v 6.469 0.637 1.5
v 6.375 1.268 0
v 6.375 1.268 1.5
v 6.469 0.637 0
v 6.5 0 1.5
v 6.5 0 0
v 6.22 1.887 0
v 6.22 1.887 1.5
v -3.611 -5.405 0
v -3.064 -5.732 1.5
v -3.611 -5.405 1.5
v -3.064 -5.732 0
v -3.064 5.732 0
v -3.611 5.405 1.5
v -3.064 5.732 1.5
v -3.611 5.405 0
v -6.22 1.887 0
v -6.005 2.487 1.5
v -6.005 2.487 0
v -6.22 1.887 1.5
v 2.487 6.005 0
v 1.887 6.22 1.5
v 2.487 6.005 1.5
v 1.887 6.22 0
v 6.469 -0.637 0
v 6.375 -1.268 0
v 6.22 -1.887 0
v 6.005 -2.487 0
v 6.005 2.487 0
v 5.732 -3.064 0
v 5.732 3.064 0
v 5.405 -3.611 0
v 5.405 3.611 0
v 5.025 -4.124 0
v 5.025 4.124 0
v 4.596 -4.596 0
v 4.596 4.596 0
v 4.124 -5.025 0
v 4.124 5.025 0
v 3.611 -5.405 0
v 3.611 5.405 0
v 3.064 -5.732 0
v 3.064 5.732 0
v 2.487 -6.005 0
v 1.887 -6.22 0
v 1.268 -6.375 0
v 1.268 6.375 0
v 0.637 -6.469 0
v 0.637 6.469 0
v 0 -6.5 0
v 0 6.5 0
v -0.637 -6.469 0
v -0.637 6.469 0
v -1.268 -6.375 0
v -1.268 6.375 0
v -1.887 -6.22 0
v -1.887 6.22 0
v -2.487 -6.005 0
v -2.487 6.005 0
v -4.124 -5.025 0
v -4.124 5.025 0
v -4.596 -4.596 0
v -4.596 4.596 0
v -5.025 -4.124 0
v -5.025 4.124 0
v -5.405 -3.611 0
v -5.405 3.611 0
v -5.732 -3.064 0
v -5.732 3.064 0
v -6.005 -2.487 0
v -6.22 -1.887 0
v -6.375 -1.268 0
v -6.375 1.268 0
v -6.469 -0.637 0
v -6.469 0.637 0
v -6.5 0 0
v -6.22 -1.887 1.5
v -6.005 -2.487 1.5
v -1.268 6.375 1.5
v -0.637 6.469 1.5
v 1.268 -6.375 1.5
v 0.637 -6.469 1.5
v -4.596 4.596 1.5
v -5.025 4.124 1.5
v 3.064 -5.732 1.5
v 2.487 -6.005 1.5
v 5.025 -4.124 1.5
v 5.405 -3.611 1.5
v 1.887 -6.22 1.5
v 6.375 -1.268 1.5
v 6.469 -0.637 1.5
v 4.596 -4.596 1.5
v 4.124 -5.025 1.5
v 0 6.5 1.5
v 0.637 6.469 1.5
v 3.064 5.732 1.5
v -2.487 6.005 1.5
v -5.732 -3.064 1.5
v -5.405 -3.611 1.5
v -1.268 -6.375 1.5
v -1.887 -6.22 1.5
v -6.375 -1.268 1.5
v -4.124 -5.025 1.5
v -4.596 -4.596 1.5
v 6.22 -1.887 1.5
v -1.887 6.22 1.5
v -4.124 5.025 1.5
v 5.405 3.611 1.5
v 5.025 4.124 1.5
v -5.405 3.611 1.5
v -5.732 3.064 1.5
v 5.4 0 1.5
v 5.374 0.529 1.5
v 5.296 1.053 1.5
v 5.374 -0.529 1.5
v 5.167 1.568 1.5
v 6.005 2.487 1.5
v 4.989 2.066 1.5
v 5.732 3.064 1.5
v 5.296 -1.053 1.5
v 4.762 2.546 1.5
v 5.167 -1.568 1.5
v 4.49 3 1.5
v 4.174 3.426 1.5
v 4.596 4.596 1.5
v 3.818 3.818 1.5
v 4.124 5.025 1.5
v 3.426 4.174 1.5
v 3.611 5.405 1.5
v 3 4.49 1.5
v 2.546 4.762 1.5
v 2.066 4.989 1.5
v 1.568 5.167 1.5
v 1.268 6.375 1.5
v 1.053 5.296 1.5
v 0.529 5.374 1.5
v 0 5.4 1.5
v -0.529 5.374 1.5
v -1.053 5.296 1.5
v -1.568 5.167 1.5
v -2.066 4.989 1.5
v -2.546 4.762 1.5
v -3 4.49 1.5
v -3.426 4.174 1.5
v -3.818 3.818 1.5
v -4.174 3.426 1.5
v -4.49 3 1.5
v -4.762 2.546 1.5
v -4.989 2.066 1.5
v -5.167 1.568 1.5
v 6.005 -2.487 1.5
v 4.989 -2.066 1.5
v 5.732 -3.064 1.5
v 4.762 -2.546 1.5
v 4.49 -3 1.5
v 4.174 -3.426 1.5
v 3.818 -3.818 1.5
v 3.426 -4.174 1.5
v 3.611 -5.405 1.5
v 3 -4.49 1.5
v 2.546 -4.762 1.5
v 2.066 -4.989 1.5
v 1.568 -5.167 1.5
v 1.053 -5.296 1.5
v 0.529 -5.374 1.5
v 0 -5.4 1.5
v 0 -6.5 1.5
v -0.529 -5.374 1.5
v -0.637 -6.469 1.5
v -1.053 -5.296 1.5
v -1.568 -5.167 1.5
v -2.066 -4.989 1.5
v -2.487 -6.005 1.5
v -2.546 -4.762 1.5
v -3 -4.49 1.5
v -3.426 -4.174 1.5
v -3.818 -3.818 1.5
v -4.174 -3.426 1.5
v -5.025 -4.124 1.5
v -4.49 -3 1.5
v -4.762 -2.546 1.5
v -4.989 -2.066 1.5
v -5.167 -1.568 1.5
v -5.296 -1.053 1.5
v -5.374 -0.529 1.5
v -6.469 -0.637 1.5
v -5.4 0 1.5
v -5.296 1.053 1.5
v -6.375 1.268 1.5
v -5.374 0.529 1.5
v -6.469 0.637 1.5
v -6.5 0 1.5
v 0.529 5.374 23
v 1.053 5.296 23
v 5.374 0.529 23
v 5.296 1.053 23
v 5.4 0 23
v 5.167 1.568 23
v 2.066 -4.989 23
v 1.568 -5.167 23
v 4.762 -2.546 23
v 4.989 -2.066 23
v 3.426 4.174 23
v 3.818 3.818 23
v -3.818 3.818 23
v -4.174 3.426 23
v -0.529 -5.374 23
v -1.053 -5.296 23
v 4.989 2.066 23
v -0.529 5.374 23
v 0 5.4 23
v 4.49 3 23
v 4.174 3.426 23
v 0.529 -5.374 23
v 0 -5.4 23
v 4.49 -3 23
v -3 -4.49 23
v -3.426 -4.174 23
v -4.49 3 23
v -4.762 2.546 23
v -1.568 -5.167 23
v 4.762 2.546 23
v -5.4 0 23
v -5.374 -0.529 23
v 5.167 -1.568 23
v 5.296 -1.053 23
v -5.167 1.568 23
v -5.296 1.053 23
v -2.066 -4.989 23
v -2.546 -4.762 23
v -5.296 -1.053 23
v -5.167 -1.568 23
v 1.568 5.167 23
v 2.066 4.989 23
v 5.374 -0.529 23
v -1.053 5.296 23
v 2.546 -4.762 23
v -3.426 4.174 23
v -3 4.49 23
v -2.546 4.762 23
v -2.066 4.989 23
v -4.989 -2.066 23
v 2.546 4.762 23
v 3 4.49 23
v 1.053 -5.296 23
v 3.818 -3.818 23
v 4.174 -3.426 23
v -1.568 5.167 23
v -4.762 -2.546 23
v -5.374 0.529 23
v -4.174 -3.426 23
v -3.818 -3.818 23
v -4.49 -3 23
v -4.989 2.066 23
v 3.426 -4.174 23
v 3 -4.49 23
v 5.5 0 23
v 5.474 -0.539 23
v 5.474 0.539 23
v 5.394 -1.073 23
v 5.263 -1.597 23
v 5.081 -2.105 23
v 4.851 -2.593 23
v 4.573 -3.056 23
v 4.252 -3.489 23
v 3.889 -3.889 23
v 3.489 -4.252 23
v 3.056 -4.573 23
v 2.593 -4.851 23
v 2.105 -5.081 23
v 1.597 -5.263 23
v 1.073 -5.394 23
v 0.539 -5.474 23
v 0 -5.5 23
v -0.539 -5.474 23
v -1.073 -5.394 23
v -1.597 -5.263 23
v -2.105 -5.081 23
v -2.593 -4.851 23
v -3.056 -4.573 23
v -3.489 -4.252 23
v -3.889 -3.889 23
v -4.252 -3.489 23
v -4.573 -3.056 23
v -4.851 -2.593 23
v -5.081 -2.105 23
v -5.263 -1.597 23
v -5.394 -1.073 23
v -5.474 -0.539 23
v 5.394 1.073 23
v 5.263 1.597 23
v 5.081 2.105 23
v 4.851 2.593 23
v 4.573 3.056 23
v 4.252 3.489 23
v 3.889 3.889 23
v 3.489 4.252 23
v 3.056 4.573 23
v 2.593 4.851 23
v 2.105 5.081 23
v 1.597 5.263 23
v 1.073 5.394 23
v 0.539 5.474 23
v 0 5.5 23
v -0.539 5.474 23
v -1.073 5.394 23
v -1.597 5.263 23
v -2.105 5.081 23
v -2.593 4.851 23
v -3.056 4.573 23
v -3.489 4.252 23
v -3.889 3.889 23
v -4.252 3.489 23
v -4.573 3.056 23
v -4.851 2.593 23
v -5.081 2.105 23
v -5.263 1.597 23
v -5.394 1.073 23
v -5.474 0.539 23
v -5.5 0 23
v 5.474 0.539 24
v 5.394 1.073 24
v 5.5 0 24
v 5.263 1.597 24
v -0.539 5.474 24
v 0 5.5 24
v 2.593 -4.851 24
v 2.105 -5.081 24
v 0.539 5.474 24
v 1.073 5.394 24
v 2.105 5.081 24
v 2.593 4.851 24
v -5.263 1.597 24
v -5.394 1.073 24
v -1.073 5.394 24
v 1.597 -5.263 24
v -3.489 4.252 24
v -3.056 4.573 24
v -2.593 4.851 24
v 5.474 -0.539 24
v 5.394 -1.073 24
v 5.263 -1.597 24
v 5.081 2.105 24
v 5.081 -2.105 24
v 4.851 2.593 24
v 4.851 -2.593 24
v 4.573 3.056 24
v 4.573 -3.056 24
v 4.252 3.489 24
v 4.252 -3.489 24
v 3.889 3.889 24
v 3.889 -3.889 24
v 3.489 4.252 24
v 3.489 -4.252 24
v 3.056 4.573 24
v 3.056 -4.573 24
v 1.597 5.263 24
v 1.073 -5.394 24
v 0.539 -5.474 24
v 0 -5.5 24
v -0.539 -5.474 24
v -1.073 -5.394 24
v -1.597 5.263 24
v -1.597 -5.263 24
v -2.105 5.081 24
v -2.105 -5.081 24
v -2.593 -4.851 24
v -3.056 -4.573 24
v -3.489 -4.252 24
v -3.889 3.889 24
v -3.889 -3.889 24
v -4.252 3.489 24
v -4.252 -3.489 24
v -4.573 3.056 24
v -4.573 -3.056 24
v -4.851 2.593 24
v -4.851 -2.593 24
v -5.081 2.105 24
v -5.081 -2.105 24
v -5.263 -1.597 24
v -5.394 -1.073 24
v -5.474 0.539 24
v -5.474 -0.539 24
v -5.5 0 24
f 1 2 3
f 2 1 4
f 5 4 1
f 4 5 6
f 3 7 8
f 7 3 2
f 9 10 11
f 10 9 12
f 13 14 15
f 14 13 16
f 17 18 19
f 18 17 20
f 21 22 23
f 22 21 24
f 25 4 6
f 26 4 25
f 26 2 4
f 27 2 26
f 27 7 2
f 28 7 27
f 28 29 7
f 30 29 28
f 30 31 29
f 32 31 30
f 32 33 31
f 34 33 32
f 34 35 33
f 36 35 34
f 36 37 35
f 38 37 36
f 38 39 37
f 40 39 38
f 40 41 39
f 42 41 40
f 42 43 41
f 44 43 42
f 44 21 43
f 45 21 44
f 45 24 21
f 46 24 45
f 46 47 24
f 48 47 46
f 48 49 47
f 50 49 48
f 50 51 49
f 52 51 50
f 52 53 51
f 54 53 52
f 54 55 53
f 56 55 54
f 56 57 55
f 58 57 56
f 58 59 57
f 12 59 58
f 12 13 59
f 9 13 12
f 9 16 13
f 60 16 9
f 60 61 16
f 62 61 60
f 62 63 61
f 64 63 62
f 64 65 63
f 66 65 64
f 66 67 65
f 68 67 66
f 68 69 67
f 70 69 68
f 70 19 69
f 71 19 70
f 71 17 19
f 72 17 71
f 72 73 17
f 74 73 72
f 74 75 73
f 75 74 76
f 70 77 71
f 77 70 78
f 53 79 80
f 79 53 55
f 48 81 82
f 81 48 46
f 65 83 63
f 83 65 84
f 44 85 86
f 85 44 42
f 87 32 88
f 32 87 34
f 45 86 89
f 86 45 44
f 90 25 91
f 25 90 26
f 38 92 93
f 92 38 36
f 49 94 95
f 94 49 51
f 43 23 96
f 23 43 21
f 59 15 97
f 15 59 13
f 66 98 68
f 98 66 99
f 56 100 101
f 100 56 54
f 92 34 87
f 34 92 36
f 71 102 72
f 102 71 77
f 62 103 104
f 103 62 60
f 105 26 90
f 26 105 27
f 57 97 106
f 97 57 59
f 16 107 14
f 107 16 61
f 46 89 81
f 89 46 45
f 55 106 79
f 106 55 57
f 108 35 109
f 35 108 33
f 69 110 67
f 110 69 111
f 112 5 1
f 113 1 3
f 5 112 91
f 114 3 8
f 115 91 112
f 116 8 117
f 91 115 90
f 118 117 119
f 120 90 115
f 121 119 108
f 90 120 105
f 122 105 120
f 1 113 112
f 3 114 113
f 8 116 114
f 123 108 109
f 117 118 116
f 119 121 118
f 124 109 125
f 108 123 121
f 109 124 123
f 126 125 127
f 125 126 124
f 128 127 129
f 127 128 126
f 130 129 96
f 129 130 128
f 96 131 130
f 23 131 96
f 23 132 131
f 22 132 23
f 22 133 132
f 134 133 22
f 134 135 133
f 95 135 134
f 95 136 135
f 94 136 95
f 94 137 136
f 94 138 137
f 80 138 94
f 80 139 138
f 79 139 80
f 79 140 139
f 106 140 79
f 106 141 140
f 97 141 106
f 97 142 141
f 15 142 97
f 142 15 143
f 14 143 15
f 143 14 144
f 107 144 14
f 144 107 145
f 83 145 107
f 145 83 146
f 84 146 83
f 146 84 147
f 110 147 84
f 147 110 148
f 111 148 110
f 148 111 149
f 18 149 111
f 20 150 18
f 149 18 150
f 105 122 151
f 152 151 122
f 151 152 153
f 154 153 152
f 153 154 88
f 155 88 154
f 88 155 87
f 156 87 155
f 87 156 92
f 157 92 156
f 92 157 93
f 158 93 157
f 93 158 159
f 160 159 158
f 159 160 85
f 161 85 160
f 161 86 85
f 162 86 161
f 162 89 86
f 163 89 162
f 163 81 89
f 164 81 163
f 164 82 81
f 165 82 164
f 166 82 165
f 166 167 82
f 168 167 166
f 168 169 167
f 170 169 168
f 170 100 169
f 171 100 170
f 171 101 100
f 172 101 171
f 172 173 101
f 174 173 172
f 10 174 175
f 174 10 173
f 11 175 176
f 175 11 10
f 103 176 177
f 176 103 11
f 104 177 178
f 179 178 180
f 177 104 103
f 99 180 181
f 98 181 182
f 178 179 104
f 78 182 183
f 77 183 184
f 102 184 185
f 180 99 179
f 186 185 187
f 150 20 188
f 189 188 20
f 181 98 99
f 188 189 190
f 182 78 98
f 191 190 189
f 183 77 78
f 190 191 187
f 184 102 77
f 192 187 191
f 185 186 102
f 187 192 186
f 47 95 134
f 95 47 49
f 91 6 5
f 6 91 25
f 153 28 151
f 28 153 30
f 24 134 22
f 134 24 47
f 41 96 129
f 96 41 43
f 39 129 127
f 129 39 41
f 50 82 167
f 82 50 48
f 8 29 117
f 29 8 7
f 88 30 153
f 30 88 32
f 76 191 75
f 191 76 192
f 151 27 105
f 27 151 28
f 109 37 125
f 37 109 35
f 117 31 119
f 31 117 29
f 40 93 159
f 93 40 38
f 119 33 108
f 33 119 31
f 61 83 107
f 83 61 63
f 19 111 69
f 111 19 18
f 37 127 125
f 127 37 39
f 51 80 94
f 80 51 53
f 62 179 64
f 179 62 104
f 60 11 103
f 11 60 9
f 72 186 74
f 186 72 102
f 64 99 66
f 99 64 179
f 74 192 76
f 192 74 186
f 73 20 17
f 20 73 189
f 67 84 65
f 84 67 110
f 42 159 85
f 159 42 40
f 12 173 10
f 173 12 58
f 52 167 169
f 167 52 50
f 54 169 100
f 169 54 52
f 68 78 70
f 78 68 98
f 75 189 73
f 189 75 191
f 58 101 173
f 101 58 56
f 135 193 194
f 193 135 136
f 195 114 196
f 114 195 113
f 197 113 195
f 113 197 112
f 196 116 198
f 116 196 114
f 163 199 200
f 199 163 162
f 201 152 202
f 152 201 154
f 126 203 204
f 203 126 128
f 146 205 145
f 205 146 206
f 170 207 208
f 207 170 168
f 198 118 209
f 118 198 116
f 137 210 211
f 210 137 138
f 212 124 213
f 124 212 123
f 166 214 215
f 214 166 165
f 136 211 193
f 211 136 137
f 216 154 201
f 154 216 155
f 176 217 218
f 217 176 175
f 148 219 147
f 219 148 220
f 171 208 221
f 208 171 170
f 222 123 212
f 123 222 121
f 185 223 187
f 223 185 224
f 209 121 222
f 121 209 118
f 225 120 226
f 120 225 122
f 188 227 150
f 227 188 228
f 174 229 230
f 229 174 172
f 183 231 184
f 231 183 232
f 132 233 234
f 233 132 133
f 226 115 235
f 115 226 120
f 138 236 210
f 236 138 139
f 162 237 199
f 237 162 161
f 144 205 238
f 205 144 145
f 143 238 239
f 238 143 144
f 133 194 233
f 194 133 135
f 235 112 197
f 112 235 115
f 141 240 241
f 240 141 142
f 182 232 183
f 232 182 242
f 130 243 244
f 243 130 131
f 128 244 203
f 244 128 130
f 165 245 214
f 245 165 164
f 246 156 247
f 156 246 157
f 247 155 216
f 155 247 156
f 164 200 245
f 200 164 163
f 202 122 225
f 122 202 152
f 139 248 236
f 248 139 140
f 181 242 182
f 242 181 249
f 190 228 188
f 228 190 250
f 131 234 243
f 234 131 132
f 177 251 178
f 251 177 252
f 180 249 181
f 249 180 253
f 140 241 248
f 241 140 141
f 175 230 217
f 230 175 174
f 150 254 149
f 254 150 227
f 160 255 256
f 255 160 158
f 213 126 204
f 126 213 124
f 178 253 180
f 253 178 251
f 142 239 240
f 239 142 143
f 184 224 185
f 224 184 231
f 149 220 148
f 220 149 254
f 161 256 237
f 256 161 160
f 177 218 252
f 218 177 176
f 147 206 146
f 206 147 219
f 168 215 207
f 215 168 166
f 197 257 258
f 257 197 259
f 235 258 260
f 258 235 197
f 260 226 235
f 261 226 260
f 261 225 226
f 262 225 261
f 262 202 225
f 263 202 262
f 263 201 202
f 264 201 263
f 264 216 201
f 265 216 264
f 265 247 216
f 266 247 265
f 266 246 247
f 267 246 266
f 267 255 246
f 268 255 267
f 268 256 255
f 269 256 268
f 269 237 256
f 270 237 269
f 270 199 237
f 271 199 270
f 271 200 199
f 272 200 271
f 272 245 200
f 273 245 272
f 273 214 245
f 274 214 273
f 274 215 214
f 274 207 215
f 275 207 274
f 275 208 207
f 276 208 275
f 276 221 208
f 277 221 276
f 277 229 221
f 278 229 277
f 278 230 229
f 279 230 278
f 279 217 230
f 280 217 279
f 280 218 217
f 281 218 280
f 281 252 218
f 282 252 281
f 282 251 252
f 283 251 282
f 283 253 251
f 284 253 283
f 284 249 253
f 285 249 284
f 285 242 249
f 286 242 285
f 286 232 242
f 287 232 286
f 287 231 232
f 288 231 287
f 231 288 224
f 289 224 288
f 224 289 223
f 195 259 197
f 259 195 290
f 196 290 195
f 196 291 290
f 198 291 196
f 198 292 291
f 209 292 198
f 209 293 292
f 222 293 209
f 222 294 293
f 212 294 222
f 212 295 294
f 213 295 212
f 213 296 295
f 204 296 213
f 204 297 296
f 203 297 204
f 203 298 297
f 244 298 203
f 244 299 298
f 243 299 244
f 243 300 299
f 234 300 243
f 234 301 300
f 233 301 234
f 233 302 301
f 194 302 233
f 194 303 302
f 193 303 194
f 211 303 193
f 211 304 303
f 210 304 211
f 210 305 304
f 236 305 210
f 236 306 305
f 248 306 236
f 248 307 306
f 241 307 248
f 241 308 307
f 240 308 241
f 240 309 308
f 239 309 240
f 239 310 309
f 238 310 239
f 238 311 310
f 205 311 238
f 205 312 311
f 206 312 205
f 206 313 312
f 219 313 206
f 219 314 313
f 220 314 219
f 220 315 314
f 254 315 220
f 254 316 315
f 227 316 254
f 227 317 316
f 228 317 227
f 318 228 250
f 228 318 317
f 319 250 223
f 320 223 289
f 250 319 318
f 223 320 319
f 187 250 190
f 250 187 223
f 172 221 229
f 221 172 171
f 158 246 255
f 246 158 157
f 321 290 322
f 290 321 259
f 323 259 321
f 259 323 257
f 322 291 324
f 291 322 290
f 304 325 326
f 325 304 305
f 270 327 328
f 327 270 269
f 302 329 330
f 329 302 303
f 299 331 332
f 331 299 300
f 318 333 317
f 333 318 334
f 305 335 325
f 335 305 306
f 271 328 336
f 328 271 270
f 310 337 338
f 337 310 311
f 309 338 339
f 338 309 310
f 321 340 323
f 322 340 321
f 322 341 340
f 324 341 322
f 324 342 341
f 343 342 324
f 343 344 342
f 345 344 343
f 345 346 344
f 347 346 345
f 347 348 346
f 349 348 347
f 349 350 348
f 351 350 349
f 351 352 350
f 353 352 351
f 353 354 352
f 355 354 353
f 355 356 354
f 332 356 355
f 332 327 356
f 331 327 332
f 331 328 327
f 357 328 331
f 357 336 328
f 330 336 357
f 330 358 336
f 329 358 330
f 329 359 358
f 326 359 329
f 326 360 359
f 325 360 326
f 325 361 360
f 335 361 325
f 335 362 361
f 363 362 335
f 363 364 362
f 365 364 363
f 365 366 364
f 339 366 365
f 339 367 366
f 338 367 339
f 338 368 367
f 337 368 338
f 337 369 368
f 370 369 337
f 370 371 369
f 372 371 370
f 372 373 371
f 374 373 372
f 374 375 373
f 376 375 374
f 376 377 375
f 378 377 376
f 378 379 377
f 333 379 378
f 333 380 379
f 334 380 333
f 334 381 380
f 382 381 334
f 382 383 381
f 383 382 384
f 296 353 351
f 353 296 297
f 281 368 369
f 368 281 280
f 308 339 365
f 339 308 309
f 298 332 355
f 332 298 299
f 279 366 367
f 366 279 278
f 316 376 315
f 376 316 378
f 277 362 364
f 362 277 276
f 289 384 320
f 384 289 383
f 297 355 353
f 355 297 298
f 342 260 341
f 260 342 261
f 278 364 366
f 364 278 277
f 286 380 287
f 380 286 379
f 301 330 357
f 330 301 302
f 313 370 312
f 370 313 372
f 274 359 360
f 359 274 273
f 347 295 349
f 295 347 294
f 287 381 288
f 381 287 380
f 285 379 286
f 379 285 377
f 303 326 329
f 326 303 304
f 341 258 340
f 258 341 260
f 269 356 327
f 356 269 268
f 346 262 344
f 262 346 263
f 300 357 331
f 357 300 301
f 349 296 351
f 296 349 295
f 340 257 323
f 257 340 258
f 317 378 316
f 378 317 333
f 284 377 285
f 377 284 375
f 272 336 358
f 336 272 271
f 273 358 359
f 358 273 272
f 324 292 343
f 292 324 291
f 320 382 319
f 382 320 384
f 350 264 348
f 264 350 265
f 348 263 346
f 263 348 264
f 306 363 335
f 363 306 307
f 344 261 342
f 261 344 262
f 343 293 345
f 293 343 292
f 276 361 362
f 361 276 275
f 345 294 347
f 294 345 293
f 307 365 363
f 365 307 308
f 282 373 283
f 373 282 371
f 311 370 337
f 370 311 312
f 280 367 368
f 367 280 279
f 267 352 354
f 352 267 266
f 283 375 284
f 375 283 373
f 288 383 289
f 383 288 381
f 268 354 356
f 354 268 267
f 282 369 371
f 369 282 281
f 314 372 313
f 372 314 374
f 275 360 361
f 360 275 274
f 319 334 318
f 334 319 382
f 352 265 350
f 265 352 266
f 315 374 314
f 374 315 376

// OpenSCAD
// Dimensions for 0.2 mL PCR Tube Adapter
// Units: mm

// Physical Dimensions
sleeve_outer_diameter = 10.8;   // Outer diameter of the main body
collar_diameter = 13.0;         // Diameter of the base collar
collar_thickness = 1.5;         // Height of the base collar
sleeve_height = 21.5;           // Total height of the sleeve body
bore_diameter = 6.2;            // Diameter of the internal bore

// Derived Dimensions
bore_radius = bore_diameter / 2;
sleeve_radius = sleeve_outer_diameter / 2;
collar_radius = collar_diameter / 2;
wall_thickness = sleeve_radius - bore_radius;

// Rendering Settings
$fn = 64; // High resolution for curved surfaces

// Main Assembly
union() {
    // 1. Base Collar (Rests on bed)
    cylinder(h = collar_thickness, r = collar_radius, center = false);

    // 2. Main Sleeve Body
    // Adjusted to start exactly at z = collar_thickness
    translate([0, 0, collar_thickness])
    cylinder(h = sleeve_height, r = sleeve_radius, center = false);

    // 3. Top Cap (to create the open bore)
    // We cut a thin disc out of the top of the cylinder to leave the bore open.
    // We extend the cutter slightly past the top face to ensure clean separation.
    translate([0, 0, collar_thickness + sleeve_height])
    cylinder(h = 1.0, r = sleeve_radius + 0.1, center = false);
}
